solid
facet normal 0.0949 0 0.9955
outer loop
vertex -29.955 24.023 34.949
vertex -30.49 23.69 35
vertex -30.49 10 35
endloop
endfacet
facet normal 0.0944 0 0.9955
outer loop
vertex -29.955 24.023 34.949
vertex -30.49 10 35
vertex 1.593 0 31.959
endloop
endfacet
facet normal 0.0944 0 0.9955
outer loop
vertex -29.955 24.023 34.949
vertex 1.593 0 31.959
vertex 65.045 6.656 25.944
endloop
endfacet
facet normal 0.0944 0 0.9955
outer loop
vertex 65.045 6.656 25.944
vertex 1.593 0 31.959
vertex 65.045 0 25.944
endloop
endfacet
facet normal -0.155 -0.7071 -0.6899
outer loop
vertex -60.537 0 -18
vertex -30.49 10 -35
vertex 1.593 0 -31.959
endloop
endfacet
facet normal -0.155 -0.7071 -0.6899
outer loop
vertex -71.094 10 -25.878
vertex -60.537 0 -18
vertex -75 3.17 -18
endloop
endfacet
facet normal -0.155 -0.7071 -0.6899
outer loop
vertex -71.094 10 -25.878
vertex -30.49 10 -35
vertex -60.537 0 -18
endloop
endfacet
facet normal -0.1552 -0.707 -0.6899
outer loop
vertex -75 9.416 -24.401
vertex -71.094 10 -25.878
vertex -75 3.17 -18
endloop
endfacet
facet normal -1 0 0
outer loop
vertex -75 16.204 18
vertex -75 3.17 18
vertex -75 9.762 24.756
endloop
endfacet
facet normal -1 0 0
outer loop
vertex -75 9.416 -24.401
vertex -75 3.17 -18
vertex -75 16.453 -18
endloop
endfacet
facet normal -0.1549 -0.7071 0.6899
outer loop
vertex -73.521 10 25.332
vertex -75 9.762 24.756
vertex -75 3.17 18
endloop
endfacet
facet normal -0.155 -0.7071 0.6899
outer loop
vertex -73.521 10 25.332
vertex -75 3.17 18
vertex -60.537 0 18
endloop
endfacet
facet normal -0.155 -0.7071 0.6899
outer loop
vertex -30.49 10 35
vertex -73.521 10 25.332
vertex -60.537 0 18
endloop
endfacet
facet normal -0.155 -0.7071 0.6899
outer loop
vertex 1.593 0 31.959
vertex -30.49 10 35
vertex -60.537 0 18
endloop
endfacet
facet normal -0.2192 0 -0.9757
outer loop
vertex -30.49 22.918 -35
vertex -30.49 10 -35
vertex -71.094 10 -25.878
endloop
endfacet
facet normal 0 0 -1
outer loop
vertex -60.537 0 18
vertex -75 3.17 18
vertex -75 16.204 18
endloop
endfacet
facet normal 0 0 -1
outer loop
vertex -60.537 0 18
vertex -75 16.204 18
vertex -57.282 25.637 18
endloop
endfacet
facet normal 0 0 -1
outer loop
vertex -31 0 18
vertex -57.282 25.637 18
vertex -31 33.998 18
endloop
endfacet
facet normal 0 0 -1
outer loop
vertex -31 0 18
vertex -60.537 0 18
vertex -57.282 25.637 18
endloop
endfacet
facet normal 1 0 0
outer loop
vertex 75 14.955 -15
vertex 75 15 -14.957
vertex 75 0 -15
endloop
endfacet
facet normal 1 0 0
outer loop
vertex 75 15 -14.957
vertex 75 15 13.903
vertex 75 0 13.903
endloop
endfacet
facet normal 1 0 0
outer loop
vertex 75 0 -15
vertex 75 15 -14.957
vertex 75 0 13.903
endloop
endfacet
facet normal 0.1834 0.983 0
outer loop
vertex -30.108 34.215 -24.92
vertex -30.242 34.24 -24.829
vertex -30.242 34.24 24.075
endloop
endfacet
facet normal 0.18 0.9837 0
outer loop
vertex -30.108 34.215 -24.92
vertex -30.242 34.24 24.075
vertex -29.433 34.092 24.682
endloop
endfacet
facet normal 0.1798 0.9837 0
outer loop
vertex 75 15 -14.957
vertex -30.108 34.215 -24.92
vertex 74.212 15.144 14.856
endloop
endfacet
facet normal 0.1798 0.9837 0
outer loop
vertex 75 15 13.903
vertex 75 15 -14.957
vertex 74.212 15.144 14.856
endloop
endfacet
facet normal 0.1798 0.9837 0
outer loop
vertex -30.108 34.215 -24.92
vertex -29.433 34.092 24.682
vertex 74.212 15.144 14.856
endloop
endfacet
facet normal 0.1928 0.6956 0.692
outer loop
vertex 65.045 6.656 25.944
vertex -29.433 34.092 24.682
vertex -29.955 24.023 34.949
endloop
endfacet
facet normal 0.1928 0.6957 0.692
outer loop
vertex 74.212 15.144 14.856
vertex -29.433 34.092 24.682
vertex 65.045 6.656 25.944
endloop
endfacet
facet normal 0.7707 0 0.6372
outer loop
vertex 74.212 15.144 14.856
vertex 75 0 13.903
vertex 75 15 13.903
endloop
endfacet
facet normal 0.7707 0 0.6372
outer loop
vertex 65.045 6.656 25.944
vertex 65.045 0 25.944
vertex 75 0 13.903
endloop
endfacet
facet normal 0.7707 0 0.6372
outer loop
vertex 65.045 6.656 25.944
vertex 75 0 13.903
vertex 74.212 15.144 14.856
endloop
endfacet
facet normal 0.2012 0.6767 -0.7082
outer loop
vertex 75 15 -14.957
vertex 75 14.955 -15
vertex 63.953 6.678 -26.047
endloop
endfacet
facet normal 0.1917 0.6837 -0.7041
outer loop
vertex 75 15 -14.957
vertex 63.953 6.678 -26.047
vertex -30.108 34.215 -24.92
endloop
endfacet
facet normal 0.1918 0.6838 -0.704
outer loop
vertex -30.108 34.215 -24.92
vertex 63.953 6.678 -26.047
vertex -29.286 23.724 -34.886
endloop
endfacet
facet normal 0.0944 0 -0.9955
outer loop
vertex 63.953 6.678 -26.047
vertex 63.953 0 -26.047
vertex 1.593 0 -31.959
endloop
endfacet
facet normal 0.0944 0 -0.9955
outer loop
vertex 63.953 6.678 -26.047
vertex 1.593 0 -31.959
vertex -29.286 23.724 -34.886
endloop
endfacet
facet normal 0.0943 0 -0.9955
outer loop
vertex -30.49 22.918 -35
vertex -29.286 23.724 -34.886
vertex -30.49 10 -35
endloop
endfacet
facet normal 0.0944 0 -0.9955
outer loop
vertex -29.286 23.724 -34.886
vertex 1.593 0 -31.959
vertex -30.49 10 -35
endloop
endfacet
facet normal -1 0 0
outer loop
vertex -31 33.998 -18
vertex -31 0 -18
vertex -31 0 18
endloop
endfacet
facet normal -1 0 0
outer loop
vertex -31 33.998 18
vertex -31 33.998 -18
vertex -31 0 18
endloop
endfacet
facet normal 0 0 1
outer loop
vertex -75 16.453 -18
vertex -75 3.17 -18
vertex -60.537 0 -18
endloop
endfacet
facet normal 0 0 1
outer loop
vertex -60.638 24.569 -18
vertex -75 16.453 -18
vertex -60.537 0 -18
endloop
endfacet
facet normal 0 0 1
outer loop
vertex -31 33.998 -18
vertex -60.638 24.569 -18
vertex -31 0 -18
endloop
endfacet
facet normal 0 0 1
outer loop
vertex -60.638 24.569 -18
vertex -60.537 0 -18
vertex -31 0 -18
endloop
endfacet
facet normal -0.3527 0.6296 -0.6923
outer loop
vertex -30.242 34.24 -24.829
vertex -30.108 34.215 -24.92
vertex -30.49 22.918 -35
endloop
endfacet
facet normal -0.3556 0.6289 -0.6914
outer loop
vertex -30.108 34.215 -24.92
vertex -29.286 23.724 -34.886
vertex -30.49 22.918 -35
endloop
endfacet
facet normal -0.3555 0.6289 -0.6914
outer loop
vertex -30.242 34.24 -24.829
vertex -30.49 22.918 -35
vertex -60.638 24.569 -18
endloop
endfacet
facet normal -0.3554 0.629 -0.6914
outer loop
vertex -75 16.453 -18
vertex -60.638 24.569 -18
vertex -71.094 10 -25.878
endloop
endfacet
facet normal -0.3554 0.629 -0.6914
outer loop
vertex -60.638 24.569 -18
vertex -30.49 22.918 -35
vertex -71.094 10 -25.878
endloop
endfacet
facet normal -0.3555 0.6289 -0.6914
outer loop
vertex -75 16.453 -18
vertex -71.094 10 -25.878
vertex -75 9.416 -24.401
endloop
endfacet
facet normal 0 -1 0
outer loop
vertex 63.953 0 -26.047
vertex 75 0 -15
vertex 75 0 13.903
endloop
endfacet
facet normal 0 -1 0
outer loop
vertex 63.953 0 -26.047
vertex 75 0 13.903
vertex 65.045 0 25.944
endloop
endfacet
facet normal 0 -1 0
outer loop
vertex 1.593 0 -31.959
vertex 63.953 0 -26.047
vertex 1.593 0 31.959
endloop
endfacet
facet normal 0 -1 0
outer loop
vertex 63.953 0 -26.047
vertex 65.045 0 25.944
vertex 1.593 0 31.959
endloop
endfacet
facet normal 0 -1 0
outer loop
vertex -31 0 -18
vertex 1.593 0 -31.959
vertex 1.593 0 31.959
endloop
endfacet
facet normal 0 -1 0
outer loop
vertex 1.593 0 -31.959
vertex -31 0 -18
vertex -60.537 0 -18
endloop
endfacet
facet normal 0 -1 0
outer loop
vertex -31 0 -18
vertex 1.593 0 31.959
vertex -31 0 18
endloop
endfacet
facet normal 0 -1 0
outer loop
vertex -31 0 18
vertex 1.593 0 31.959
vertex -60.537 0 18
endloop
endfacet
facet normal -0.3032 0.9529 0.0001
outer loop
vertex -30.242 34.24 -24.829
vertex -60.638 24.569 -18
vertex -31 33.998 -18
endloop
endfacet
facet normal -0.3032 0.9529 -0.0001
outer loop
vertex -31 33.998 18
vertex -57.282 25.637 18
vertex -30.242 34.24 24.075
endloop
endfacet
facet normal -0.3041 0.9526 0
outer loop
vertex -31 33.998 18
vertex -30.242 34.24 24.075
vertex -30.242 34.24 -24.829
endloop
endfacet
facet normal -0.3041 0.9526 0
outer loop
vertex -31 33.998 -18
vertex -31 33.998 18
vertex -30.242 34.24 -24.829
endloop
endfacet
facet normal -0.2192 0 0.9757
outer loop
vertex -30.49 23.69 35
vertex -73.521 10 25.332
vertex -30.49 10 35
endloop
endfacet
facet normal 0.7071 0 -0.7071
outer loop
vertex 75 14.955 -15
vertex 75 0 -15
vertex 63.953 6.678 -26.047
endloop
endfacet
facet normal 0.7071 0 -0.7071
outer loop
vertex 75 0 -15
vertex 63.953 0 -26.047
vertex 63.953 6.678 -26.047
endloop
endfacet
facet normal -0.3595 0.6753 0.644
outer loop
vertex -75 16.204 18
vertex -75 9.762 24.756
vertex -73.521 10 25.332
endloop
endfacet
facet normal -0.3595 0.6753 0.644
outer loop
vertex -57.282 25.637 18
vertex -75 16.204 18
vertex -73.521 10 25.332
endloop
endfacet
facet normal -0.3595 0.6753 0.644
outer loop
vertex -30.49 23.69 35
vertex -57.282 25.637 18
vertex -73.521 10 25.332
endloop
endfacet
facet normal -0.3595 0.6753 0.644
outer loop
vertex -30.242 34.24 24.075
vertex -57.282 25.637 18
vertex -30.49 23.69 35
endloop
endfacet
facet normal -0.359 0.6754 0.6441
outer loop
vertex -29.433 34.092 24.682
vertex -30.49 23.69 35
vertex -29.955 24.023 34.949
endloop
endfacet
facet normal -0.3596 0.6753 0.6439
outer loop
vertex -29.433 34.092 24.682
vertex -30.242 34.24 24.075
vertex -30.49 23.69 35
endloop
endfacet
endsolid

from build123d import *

# Parameters (mm, degrees)
BOSS_EXTRUDE1_DEPTH = 35
SKETCH3_W           = 44
SKETCH3_H           = 36
CUT_EXTRUDE1_DEPTH  = 90.567584934
CHAMFER1_SIZE       = 10
CHAMFER1_SIZE_2     = 11.096755526
CHAMFER1_SIZE2      = 10.174134289
CHAMFER1_SIZE2_2    = 10.73729935


with BuildPart() as part:
    # Sketch1 → Boss-Extrude1 (new, symmetric)
    with BuildSketch(Plane.XY):
        Polygon((75, 0), (-75, 0), (-75, 20), (-30.241576831, 34.239630123), (75, 15), align=None)
    extrude(amount=BOSS_EXTRUDE1_DEPTH, both=True)

    # Sketch3 → Cut-Extrude1 (cut, through all)
    with BuildSketch(Plane.XZ):
        Polygon((-30.49, 35), (75, 25), (75, 35), align=None)
        Polygon((75, -35), (75, -25), (-30.49, -35), align=None)
        with Locations((-53, 0)):
            Rectangle(SKETCH3_W, SKETCH3_H)
        Polygon((-75, 25), (-30.49, 35), (-75, 35), align=None)
        Polygon((-75, -35), (-30.49, -35), (-75, -25), align=None)
    extrude(amount=-CUT_EXTRUDE1_DEPTH, mode=Mode.SUBTRACT)

    # Chamfer1
    chamfer1_edges = [part.edges().sort_by_distance(p)[0] for p in [
        (-52.745, 0, 30),
    ]]
    chamfer(chamfer1_edges, length=CHAMFER1_SIZE)
    chamfer1_2_edges = [part.edges().sort_by_distance(p)[0] for p in [
        (-52.745, 0, -30),
    ]]
    chamfer(chamfer1_2_edges, length=CHAMFER1_SIZE)
    chamfer1_3_edges = [part.edges().sort_by_distance(p)[0] for p in [
        (75, 7.5, 25),
    ]]
    chamfer1_3_side = [part.faces().sort_by_distance(p)[0] for p in [
        (75, 7.5, 24.8),
    ]]
    chamfer(chamfer1_3_edges, length=CHAMFER1_SIZE_2, length2=CHAMFER1_SIZE, reference=chamfer1_3_side[0])
    chamfer1_4_edges = [part.edges().sort_by_distance(p)[0] for p in [
        (75, 7.5, -25),
    ]]
    chamfer1_4_side = [part.faces().sort_by_distance(p)[0] for p in [
        (75, 7.5, -24.8),
    ]]
    chamfer(chamfer1_4_edges, length=CHAMFER1_SIZE, length2=CHAMFER1_SIZE_2, reference=chamfer1_4_side[0])
    chamfer1_5_edges = [part.edges().sort_by_distance(p)[0] for p in [
        (17.401526868, 25.52980535, 30.460088457),
    ]]
    chamfer1_5_side = [part.faces().sort_by_distance(p)[0] for p in [
        (17.365875348, 25.3330376, 30.463468068),
    ]]
    chamfer(chamfer1_5_edges, length=CHAMFER1_SIZE, length2=CHAMFER1_SIZE2, reference=chamfer1_5_side[0])
    chamfer1_6_edges = [part.edges().sort_by_distance(p)[0] for p in [
        (-58.87630634, 25.129658681, 28.622487904),
    ]]
    chamfer1_6_side = [part.faces().sort_by_distance(p)[0] for p in [
        (-58.818457754, 24.938649191, 28.635484665),
    ]]
    chamfer(chamfer1_6_edges, length=CHAMFER1_SIZE, length2=CHAMFER1_SIZE2_2, reference=chamfer1_6_side[0])
    chamfer1_7_edges = [part.edges().sort_by_distance(p)[0] for p in [
        (-52.745, 27.080297874, -30),
    ]]
    chamfer1_7_side = [part.faces().sort_by_distance(p)[0] for p in [
        (-52.705100441, 27.092991685, -29.804431873),
    ]]
    chamfer(chamfer1_7_edges, length=CHAMFER1_SIZE, length2=CHAMFER1_SIZE2_2, reference=chamfer1_7_side[0])
    chamfer1_8_edges = [part.edges().sort_by_distance(p)[0] for p in [
        (23.400963602, 24.433024522, -29.891367561),
    ]]
    chamfer1_8_side = [part.faces().sort_by_distance(p)[0] for p in [
        (23.382696848, 24.43636394, -29.692231492),
    ]]
    chamfer(chamfer1_8_edges, length=CHAMFER1_SIZE, length2=CHAMFER1_SIZE2, reference=chamfer1_8_side[0])


solid = part.part
